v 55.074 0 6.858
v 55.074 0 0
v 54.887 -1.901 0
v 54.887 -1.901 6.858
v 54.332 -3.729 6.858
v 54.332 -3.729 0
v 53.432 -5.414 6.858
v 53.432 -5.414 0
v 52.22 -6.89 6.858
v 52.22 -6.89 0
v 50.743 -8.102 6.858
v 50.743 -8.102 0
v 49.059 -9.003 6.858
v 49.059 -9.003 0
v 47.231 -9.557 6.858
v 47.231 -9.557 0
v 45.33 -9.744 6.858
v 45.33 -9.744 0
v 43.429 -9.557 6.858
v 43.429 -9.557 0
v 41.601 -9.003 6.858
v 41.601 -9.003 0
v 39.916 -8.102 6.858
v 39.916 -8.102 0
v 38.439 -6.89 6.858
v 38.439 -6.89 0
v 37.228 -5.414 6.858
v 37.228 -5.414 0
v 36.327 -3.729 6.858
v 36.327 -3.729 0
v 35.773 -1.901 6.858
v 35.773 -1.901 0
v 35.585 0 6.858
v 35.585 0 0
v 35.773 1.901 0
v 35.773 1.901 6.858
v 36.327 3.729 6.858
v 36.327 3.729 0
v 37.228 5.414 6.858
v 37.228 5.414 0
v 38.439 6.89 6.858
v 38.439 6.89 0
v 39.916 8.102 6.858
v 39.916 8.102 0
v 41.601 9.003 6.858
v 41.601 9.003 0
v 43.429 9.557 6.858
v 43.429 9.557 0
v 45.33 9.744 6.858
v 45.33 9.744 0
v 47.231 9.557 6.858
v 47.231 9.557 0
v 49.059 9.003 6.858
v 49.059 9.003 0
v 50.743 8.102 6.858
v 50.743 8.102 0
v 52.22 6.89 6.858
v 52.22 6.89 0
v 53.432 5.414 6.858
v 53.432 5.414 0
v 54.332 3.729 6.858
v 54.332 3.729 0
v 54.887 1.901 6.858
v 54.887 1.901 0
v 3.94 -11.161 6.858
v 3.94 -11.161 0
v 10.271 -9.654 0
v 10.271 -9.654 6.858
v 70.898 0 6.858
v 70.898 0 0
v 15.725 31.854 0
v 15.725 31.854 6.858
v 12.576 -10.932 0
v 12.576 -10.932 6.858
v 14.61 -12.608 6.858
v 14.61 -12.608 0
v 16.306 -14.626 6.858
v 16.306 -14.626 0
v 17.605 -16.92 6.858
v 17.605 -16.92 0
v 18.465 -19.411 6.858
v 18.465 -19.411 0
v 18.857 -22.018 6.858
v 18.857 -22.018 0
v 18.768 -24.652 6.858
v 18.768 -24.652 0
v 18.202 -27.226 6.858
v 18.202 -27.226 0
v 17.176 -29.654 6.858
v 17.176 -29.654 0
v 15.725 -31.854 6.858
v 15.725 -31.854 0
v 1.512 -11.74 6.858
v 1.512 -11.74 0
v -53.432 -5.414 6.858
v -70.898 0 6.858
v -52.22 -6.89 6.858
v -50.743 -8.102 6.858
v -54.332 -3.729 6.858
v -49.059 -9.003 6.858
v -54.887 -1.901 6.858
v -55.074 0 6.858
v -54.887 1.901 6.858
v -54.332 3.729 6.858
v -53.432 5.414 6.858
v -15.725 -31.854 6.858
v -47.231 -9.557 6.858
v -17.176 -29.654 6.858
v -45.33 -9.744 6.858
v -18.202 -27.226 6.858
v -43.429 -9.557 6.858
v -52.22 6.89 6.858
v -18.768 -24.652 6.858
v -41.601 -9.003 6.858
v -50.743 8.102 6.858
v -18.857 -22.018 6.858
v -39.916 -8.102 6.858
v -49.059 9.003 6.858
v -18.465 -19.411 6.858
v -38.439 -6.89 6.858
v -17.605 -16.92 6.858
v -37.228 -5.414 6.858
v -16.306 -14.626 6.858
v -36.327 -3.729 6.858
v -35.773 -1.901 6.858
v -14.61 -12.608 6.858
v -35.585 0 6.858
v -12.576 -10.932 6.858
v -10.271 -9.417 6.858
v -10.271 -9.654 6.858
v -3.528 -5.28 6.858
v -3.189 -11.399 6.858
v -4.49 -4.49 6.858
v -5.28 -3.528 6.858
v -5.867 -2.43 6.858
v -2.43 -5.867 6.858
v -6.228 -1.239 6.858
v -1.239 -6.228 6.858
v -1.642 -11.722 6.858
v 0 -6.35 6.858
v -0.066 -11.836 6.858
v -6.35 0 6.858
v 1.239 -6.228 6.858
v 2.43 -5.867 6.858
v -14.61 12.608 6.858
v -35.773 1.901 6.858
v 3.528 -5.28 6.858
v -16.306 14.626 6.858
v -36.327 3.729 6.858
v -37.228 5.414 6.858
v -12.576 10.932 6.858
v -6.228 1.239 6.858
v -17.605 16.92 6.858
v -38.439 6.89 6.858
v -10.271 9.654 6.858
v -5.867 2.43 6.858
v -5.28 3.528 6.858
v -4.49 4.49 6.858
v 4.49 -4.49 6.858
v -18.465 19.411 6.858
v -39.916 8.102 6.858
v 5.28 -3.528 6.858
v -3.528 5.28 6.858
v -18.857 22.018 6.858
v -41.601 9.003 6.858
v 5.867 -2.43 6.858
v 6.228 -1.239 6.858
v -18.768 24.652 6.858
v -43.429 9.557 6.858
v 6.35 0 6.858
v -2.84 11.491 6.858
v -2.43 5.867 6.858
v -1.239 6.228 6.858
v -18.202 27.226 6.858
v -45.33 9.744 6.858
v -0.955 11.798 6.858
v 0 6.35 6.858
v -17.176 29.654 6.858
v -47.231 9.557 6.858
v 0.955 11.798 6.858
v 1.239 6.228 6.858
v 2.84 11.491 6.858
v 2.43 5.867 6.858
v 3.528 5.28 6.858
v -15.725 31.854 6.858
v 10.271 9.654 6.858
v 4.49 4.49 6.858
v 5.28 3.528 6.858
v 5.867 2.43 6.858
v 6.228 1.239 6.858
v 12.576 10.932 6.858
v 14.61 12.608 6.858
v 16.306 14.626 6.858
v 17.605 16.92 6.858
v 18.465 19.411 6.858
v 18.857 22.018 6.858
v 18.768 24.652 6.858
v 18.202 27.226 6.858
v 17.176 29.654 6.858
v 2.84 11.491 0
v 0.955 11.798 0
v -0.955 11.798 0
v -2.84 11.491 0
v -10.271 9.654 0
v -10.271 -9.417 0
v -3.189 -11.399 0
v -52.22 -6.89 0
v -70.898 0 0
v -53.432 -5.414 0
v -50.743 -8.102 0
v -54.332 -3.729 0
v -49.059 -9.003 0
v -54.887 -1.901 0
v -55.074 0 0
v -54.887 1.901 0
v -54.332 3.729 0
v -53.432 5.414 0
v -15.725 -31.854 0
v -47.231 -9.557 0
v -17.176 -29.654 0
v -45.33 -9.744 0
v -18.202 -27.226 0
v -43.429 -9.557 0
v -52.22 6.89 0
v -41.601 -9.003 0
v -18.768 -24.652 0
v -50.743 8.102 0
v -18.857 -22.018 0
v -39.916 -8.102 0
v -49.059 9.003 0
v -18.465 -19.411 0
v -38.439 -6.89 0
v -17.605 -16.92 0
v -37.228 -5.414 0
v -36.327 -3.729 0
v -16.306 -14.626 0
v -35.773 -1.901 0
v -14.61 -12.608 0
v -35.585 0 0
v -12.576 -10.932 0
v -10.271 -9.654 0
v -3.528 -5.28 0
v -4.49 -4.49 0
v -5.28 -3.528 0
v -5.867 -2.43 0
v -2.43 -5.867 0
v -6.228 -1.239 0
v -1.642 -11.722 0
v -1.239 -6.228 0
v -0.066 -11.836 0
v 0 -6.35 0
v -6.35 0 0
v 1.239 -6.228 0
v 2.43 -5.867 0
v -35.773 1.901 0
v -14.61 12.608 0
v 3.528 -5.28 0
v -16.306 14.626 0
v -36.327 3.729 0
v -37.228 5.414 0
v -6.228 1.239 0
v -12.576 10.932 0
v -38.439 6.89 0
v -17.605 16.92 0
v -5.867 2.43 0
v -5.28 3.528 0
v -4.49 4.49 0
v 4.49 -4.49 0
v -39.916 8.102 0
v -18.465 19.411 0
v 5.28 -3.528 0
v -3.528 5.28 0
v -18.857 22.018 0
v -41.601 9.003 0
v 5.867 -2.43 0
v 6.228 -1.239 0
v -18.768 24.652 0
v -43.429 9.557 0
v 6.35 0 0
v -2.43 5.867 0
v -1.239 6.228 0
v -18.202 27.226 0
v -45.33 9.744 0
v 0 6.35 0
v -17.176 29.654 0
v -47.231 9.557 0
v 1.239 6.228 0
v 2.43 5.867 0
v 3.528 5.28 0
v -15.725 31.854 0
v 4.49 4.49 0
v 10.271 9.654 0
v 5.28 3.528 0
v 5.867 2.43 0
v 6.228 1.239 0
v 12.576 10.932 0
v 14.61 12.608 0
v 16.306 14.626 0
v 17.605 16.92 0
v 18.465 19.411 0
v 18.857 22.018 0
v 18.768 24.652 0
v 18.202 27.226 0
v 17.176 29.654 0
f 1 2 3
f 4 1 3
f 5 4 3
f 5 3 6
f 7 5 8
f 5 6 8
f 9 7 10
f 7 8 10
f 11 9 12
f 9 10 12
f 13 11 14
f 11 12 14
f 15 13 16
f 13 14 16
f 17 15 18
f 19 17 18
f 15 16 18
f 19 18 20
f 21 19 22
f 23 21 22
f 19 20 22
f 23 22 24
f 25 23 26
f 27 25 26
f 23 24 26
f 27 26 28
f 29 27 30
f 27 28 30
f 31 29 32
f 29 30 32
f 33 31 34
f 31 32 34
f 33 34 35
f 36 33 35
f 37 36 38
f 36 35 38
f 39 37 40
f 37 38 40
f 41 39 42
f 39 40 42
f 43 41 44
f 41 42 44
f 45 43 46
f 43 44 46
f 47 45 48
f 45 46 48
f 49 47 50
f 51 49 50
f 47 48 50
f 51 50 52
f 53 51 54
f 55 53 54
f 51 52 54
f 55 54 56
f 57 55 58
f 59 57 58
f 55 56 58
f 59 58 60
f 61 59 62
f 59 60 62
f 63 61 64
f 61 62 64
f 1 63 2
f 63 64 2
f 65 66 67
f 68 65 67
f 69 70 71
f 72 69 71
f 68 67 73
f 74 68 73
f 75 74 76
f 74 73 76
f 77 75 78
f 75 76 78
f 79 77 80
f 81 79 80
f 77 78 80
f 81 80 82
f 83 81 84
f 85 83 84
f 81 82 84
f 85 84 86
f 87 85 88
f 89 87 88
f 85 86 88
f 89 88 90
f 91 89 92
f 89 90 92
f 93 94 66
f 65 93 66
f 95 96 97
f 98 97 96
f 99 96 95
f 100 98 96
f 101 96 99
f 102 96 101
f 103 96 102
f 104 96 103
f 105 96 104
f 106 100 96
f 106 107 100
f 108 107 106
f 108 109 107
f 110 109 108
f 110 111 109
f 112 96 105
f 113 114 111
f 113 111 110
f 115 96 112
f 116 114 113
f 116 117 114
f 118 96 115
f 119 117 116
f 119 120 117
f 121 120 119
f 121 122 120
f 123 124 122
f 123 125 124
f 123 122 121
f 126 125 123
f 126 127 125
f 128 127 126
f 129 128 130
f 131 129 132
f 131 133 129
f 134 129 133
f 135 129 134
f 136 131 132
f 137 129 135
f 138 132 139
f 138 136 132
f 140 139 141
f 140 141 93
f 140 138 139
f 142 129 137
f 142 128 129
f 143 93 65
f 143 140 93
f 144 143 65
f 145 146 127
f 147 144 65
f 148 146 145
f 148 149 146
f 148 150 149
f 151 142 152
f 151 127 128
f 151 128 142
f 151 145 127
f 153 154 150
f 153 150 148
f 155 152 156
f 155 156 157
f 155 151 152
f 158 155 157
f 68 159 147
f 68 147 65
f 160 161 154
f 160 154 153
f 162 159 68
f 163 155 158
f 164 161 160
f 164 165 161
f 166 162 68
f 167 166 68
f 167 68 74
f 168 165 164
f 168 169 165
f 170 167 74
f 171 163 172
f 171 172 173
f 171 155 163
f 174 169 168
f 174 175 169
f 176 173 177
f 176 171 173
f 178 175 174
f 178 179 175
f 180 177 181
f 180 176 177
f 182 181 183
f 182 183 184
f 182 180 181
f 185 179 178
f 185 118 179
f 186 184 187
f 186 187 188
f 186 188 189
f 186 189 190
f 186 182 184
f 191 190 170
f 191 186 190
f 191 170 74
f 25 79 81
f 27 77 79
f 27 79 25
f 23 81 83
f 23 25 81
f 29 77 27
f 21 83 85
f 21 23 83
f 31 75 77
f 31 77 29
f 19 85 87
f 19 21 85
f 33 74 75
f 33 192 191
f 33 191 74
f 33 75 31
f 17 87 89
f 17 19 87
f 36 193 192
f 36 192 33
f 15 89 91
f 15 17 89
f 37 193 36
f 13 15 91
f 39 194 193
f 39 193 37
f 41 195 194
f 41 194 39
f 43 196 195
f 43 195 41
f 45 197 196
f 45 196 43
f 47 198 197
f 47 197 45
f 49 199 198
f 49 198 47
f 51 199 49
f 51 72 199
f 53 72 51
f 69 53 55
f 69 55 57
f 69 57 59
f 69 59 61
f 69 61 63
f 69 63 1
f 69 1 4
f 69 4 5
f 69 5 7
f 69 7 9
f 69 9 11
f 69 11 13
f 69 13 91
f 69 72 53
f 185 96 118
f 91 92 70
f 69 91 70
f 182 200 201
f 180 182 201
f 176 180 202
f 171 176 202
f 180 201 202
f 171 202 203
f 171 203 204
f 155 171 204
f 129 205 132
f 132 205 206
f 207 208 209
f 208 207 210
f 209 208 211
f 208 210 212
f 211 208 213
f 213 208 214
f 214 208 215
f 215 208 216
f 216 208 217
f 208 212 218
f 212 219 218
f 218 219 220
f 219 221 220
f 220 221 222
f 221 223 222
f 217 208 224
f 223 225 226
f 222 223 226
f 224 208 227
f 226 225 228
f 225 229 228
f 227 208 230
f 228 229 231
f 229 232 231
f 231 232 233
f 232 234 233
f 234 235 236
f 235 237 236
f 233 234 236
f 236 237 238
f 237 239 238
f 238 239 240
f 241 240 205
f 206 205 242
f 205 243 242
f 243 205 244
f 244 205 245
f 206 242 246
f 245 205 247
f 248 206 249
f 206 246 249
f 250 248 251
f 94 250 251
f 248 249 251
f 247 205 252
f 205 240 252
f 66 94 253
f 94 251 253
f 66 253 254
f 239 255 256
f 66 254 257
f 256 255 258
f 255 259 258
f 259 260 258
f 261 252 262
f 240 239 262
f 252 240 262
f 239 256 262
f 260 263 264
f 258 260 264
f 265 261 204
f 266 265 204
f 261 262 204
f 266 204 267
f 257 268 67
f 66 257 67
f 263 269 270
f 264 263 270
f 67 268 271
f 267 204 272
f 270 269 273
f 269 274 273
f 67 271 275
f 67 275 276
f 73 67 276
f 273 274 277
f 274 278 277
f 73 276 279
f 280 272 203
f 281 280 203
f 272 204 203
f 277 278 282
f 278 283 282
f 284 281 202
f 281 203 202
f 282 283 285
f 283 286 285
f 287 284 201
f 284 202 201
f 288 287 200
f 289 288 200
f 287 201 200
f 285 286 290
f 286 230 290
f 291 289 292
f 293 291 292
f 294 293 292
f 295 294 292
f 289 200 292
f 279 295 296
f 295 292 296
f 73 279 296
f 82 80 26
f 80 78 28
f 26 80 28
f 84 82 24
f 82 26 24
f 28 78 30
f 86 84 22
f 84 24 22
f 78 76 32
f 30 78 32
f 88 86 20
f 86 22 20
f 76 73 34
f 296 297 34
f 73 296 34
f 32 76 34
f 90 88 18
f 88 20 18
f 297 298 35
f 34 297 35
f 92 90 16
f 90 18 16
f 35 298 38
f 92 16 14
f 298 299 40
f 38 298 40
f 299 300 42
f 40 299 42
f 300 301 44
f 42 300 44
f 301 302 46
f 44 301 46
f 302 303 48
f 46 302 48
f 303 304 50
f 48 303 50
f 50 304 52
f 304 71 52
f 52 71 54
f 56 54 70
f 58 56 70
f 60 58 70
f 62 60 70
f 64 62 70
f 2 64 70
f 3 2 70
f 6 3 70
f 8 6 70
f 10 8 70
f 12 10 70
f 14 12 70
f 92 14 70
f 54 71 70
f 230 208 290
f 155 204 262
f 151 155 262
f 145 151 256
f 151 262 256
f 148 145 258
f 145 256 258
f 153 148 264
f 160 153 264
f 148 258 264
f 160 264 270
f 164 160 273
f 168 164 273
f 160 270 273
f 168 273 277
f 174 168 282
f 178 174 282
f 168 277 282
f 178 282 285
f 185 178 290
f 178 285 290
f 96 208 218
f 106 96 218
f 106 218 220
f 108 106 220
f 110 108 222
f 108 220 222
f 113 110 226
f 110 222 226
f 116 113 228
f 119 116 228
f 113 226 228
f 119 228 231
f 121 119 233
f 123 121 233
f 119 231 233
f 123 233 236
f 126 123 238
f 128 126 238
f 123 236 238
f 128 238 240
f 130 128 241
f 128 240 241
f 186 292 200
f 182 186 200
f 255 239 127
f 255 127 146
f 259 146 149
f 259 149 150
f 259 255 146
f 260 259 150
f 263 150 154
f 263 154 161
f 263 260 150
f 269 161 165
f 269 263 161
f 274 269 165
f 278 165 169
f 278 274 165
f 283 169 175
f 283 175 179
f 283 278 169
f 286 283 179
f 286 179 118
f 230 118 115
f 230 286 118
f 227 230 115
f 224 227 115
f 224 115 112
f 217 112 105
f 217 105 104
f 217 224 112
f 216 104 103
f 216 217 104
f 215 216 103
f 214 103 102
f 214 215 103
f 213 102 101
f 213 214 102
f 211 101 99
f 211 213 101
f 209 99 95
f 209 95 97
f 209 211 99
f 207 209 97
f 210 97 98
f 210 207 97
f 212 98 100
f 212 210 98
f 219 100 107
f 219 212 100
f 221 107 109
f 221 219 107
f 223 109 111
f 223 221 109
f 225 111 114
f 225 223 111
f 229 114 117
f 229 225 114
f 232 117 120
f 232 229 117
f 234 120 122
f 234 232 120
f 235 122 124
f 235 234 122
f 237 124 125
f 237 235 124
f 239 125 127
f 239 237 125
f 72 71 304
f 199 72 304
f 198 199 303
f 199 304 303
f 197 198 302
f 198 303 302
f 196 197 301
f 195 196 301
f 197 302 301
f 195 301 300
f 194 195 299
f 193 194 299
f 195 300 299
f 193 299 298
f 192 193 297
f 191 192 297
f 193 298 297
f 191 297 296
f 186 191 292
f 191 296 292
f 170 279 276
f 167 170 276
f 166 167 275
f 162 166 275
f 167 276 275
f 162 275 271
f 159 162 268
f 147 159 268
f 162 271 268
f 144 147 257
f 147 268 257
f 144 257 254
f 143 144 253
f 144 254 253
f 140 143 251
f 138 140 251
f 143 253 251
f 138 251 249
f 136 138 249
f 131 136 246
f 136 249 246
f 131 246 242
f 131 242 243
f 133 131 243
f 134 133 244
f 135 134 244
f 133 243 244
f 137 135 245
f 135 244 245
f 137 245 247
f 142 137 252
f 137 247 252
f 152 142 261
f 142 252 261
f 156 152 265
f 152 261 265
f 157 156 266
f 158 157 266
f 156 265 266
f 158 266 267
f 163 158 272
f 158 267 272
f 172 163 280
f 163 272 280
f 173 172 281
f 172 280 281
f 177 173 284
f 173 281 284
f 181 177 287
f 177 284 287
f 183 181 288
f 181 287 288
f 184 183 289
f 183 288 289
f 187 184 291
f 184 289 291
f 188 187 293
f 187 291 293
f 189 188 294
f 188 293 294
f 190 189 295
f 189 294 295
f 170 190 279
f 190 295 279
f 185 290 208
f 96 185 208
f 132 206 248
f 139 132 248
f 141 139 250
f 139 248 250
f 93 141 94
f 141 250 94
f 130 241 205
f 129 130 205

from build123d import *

# Parameters (mm, degrees)
F0_R     = 9.744375
F1_DEPTH = 6.858


with BuildPart() as f1:
    # F0 (on Top) → F1 (new body)
    with BuildSketch(Plane.XY):
        with BuildLine():
            Line((-10.271028, -9.6542), (-10.271028, -9.41727))
            Line((-10.271028, -9.41727), (-3.189457, -11.398748))
            ThreePointArc((-3.189457, -11.398748), (-0.855809, -11.805579), (1.512117, -11.739574))
            Line((1.512117, -11.739574), (3.940298, -11.161458))
            Line((3.940298, -11.161458), (10.271028, -9.6542))
            ThreePointArc((10.271028, -9.6542), (18.465013, -19.411145), (15.724788, -31.854236))
            Line((15.724788, -31.854236), (70.897943, 0))
            Line((70.897943, 0), (15.724788, 31.854236))
            ThreePointArc((15.724788, 31.854236), (18.465013, 19.411145), (10.271028, 9.6542))
            Line((10.271028, 9.6542), (2.839986, 11.490804))
            ThreePointArc((2.839986, 11.490804), (0, 11.836558), (-2.839986, 11.490804))
            Line((-2.839986, 11.490804), (-10.271028, 9.6542))
            ThreePointArc((-10.271028, 9.6542), (-18.465013, 19.411145), (-15.724788, 31.854236))
            Line((-15.724788, 31.854236), (-70.897943, 0))
            Line((-70.897943, 0), (-15.724788, -31.854236))
            ThreePointArc((-15.724788, -31.854236), (-18.465013, -19.411145), (-10.271028, -9.6542))
        make_face()
        with Locations((-45.329779, 0)):
            Circle(F0_R, mode=Mode.SUBTRACT)
        with BuildLine():
            ThreePointArc((-6.35, 0), (0, 6.35), (6.35, 0))
            ThreePointArc((6.35, 0), (0, -6.35), (-6.35, 0))
        make_face(mode=Mode.SUBTRACT)
        with BuildLine():
            ThreePointArc((55.074155, 0), (45.329779, -9.744375), (35.585404, 0))
            ThreePointArc((35.585404, 0), (45.329779, 9.744375), (55.074155, 0))
        make_face(mode=Mode.SUBTRACT)
    extrude(amount=F1_DEPTH)


solid = f1.part
